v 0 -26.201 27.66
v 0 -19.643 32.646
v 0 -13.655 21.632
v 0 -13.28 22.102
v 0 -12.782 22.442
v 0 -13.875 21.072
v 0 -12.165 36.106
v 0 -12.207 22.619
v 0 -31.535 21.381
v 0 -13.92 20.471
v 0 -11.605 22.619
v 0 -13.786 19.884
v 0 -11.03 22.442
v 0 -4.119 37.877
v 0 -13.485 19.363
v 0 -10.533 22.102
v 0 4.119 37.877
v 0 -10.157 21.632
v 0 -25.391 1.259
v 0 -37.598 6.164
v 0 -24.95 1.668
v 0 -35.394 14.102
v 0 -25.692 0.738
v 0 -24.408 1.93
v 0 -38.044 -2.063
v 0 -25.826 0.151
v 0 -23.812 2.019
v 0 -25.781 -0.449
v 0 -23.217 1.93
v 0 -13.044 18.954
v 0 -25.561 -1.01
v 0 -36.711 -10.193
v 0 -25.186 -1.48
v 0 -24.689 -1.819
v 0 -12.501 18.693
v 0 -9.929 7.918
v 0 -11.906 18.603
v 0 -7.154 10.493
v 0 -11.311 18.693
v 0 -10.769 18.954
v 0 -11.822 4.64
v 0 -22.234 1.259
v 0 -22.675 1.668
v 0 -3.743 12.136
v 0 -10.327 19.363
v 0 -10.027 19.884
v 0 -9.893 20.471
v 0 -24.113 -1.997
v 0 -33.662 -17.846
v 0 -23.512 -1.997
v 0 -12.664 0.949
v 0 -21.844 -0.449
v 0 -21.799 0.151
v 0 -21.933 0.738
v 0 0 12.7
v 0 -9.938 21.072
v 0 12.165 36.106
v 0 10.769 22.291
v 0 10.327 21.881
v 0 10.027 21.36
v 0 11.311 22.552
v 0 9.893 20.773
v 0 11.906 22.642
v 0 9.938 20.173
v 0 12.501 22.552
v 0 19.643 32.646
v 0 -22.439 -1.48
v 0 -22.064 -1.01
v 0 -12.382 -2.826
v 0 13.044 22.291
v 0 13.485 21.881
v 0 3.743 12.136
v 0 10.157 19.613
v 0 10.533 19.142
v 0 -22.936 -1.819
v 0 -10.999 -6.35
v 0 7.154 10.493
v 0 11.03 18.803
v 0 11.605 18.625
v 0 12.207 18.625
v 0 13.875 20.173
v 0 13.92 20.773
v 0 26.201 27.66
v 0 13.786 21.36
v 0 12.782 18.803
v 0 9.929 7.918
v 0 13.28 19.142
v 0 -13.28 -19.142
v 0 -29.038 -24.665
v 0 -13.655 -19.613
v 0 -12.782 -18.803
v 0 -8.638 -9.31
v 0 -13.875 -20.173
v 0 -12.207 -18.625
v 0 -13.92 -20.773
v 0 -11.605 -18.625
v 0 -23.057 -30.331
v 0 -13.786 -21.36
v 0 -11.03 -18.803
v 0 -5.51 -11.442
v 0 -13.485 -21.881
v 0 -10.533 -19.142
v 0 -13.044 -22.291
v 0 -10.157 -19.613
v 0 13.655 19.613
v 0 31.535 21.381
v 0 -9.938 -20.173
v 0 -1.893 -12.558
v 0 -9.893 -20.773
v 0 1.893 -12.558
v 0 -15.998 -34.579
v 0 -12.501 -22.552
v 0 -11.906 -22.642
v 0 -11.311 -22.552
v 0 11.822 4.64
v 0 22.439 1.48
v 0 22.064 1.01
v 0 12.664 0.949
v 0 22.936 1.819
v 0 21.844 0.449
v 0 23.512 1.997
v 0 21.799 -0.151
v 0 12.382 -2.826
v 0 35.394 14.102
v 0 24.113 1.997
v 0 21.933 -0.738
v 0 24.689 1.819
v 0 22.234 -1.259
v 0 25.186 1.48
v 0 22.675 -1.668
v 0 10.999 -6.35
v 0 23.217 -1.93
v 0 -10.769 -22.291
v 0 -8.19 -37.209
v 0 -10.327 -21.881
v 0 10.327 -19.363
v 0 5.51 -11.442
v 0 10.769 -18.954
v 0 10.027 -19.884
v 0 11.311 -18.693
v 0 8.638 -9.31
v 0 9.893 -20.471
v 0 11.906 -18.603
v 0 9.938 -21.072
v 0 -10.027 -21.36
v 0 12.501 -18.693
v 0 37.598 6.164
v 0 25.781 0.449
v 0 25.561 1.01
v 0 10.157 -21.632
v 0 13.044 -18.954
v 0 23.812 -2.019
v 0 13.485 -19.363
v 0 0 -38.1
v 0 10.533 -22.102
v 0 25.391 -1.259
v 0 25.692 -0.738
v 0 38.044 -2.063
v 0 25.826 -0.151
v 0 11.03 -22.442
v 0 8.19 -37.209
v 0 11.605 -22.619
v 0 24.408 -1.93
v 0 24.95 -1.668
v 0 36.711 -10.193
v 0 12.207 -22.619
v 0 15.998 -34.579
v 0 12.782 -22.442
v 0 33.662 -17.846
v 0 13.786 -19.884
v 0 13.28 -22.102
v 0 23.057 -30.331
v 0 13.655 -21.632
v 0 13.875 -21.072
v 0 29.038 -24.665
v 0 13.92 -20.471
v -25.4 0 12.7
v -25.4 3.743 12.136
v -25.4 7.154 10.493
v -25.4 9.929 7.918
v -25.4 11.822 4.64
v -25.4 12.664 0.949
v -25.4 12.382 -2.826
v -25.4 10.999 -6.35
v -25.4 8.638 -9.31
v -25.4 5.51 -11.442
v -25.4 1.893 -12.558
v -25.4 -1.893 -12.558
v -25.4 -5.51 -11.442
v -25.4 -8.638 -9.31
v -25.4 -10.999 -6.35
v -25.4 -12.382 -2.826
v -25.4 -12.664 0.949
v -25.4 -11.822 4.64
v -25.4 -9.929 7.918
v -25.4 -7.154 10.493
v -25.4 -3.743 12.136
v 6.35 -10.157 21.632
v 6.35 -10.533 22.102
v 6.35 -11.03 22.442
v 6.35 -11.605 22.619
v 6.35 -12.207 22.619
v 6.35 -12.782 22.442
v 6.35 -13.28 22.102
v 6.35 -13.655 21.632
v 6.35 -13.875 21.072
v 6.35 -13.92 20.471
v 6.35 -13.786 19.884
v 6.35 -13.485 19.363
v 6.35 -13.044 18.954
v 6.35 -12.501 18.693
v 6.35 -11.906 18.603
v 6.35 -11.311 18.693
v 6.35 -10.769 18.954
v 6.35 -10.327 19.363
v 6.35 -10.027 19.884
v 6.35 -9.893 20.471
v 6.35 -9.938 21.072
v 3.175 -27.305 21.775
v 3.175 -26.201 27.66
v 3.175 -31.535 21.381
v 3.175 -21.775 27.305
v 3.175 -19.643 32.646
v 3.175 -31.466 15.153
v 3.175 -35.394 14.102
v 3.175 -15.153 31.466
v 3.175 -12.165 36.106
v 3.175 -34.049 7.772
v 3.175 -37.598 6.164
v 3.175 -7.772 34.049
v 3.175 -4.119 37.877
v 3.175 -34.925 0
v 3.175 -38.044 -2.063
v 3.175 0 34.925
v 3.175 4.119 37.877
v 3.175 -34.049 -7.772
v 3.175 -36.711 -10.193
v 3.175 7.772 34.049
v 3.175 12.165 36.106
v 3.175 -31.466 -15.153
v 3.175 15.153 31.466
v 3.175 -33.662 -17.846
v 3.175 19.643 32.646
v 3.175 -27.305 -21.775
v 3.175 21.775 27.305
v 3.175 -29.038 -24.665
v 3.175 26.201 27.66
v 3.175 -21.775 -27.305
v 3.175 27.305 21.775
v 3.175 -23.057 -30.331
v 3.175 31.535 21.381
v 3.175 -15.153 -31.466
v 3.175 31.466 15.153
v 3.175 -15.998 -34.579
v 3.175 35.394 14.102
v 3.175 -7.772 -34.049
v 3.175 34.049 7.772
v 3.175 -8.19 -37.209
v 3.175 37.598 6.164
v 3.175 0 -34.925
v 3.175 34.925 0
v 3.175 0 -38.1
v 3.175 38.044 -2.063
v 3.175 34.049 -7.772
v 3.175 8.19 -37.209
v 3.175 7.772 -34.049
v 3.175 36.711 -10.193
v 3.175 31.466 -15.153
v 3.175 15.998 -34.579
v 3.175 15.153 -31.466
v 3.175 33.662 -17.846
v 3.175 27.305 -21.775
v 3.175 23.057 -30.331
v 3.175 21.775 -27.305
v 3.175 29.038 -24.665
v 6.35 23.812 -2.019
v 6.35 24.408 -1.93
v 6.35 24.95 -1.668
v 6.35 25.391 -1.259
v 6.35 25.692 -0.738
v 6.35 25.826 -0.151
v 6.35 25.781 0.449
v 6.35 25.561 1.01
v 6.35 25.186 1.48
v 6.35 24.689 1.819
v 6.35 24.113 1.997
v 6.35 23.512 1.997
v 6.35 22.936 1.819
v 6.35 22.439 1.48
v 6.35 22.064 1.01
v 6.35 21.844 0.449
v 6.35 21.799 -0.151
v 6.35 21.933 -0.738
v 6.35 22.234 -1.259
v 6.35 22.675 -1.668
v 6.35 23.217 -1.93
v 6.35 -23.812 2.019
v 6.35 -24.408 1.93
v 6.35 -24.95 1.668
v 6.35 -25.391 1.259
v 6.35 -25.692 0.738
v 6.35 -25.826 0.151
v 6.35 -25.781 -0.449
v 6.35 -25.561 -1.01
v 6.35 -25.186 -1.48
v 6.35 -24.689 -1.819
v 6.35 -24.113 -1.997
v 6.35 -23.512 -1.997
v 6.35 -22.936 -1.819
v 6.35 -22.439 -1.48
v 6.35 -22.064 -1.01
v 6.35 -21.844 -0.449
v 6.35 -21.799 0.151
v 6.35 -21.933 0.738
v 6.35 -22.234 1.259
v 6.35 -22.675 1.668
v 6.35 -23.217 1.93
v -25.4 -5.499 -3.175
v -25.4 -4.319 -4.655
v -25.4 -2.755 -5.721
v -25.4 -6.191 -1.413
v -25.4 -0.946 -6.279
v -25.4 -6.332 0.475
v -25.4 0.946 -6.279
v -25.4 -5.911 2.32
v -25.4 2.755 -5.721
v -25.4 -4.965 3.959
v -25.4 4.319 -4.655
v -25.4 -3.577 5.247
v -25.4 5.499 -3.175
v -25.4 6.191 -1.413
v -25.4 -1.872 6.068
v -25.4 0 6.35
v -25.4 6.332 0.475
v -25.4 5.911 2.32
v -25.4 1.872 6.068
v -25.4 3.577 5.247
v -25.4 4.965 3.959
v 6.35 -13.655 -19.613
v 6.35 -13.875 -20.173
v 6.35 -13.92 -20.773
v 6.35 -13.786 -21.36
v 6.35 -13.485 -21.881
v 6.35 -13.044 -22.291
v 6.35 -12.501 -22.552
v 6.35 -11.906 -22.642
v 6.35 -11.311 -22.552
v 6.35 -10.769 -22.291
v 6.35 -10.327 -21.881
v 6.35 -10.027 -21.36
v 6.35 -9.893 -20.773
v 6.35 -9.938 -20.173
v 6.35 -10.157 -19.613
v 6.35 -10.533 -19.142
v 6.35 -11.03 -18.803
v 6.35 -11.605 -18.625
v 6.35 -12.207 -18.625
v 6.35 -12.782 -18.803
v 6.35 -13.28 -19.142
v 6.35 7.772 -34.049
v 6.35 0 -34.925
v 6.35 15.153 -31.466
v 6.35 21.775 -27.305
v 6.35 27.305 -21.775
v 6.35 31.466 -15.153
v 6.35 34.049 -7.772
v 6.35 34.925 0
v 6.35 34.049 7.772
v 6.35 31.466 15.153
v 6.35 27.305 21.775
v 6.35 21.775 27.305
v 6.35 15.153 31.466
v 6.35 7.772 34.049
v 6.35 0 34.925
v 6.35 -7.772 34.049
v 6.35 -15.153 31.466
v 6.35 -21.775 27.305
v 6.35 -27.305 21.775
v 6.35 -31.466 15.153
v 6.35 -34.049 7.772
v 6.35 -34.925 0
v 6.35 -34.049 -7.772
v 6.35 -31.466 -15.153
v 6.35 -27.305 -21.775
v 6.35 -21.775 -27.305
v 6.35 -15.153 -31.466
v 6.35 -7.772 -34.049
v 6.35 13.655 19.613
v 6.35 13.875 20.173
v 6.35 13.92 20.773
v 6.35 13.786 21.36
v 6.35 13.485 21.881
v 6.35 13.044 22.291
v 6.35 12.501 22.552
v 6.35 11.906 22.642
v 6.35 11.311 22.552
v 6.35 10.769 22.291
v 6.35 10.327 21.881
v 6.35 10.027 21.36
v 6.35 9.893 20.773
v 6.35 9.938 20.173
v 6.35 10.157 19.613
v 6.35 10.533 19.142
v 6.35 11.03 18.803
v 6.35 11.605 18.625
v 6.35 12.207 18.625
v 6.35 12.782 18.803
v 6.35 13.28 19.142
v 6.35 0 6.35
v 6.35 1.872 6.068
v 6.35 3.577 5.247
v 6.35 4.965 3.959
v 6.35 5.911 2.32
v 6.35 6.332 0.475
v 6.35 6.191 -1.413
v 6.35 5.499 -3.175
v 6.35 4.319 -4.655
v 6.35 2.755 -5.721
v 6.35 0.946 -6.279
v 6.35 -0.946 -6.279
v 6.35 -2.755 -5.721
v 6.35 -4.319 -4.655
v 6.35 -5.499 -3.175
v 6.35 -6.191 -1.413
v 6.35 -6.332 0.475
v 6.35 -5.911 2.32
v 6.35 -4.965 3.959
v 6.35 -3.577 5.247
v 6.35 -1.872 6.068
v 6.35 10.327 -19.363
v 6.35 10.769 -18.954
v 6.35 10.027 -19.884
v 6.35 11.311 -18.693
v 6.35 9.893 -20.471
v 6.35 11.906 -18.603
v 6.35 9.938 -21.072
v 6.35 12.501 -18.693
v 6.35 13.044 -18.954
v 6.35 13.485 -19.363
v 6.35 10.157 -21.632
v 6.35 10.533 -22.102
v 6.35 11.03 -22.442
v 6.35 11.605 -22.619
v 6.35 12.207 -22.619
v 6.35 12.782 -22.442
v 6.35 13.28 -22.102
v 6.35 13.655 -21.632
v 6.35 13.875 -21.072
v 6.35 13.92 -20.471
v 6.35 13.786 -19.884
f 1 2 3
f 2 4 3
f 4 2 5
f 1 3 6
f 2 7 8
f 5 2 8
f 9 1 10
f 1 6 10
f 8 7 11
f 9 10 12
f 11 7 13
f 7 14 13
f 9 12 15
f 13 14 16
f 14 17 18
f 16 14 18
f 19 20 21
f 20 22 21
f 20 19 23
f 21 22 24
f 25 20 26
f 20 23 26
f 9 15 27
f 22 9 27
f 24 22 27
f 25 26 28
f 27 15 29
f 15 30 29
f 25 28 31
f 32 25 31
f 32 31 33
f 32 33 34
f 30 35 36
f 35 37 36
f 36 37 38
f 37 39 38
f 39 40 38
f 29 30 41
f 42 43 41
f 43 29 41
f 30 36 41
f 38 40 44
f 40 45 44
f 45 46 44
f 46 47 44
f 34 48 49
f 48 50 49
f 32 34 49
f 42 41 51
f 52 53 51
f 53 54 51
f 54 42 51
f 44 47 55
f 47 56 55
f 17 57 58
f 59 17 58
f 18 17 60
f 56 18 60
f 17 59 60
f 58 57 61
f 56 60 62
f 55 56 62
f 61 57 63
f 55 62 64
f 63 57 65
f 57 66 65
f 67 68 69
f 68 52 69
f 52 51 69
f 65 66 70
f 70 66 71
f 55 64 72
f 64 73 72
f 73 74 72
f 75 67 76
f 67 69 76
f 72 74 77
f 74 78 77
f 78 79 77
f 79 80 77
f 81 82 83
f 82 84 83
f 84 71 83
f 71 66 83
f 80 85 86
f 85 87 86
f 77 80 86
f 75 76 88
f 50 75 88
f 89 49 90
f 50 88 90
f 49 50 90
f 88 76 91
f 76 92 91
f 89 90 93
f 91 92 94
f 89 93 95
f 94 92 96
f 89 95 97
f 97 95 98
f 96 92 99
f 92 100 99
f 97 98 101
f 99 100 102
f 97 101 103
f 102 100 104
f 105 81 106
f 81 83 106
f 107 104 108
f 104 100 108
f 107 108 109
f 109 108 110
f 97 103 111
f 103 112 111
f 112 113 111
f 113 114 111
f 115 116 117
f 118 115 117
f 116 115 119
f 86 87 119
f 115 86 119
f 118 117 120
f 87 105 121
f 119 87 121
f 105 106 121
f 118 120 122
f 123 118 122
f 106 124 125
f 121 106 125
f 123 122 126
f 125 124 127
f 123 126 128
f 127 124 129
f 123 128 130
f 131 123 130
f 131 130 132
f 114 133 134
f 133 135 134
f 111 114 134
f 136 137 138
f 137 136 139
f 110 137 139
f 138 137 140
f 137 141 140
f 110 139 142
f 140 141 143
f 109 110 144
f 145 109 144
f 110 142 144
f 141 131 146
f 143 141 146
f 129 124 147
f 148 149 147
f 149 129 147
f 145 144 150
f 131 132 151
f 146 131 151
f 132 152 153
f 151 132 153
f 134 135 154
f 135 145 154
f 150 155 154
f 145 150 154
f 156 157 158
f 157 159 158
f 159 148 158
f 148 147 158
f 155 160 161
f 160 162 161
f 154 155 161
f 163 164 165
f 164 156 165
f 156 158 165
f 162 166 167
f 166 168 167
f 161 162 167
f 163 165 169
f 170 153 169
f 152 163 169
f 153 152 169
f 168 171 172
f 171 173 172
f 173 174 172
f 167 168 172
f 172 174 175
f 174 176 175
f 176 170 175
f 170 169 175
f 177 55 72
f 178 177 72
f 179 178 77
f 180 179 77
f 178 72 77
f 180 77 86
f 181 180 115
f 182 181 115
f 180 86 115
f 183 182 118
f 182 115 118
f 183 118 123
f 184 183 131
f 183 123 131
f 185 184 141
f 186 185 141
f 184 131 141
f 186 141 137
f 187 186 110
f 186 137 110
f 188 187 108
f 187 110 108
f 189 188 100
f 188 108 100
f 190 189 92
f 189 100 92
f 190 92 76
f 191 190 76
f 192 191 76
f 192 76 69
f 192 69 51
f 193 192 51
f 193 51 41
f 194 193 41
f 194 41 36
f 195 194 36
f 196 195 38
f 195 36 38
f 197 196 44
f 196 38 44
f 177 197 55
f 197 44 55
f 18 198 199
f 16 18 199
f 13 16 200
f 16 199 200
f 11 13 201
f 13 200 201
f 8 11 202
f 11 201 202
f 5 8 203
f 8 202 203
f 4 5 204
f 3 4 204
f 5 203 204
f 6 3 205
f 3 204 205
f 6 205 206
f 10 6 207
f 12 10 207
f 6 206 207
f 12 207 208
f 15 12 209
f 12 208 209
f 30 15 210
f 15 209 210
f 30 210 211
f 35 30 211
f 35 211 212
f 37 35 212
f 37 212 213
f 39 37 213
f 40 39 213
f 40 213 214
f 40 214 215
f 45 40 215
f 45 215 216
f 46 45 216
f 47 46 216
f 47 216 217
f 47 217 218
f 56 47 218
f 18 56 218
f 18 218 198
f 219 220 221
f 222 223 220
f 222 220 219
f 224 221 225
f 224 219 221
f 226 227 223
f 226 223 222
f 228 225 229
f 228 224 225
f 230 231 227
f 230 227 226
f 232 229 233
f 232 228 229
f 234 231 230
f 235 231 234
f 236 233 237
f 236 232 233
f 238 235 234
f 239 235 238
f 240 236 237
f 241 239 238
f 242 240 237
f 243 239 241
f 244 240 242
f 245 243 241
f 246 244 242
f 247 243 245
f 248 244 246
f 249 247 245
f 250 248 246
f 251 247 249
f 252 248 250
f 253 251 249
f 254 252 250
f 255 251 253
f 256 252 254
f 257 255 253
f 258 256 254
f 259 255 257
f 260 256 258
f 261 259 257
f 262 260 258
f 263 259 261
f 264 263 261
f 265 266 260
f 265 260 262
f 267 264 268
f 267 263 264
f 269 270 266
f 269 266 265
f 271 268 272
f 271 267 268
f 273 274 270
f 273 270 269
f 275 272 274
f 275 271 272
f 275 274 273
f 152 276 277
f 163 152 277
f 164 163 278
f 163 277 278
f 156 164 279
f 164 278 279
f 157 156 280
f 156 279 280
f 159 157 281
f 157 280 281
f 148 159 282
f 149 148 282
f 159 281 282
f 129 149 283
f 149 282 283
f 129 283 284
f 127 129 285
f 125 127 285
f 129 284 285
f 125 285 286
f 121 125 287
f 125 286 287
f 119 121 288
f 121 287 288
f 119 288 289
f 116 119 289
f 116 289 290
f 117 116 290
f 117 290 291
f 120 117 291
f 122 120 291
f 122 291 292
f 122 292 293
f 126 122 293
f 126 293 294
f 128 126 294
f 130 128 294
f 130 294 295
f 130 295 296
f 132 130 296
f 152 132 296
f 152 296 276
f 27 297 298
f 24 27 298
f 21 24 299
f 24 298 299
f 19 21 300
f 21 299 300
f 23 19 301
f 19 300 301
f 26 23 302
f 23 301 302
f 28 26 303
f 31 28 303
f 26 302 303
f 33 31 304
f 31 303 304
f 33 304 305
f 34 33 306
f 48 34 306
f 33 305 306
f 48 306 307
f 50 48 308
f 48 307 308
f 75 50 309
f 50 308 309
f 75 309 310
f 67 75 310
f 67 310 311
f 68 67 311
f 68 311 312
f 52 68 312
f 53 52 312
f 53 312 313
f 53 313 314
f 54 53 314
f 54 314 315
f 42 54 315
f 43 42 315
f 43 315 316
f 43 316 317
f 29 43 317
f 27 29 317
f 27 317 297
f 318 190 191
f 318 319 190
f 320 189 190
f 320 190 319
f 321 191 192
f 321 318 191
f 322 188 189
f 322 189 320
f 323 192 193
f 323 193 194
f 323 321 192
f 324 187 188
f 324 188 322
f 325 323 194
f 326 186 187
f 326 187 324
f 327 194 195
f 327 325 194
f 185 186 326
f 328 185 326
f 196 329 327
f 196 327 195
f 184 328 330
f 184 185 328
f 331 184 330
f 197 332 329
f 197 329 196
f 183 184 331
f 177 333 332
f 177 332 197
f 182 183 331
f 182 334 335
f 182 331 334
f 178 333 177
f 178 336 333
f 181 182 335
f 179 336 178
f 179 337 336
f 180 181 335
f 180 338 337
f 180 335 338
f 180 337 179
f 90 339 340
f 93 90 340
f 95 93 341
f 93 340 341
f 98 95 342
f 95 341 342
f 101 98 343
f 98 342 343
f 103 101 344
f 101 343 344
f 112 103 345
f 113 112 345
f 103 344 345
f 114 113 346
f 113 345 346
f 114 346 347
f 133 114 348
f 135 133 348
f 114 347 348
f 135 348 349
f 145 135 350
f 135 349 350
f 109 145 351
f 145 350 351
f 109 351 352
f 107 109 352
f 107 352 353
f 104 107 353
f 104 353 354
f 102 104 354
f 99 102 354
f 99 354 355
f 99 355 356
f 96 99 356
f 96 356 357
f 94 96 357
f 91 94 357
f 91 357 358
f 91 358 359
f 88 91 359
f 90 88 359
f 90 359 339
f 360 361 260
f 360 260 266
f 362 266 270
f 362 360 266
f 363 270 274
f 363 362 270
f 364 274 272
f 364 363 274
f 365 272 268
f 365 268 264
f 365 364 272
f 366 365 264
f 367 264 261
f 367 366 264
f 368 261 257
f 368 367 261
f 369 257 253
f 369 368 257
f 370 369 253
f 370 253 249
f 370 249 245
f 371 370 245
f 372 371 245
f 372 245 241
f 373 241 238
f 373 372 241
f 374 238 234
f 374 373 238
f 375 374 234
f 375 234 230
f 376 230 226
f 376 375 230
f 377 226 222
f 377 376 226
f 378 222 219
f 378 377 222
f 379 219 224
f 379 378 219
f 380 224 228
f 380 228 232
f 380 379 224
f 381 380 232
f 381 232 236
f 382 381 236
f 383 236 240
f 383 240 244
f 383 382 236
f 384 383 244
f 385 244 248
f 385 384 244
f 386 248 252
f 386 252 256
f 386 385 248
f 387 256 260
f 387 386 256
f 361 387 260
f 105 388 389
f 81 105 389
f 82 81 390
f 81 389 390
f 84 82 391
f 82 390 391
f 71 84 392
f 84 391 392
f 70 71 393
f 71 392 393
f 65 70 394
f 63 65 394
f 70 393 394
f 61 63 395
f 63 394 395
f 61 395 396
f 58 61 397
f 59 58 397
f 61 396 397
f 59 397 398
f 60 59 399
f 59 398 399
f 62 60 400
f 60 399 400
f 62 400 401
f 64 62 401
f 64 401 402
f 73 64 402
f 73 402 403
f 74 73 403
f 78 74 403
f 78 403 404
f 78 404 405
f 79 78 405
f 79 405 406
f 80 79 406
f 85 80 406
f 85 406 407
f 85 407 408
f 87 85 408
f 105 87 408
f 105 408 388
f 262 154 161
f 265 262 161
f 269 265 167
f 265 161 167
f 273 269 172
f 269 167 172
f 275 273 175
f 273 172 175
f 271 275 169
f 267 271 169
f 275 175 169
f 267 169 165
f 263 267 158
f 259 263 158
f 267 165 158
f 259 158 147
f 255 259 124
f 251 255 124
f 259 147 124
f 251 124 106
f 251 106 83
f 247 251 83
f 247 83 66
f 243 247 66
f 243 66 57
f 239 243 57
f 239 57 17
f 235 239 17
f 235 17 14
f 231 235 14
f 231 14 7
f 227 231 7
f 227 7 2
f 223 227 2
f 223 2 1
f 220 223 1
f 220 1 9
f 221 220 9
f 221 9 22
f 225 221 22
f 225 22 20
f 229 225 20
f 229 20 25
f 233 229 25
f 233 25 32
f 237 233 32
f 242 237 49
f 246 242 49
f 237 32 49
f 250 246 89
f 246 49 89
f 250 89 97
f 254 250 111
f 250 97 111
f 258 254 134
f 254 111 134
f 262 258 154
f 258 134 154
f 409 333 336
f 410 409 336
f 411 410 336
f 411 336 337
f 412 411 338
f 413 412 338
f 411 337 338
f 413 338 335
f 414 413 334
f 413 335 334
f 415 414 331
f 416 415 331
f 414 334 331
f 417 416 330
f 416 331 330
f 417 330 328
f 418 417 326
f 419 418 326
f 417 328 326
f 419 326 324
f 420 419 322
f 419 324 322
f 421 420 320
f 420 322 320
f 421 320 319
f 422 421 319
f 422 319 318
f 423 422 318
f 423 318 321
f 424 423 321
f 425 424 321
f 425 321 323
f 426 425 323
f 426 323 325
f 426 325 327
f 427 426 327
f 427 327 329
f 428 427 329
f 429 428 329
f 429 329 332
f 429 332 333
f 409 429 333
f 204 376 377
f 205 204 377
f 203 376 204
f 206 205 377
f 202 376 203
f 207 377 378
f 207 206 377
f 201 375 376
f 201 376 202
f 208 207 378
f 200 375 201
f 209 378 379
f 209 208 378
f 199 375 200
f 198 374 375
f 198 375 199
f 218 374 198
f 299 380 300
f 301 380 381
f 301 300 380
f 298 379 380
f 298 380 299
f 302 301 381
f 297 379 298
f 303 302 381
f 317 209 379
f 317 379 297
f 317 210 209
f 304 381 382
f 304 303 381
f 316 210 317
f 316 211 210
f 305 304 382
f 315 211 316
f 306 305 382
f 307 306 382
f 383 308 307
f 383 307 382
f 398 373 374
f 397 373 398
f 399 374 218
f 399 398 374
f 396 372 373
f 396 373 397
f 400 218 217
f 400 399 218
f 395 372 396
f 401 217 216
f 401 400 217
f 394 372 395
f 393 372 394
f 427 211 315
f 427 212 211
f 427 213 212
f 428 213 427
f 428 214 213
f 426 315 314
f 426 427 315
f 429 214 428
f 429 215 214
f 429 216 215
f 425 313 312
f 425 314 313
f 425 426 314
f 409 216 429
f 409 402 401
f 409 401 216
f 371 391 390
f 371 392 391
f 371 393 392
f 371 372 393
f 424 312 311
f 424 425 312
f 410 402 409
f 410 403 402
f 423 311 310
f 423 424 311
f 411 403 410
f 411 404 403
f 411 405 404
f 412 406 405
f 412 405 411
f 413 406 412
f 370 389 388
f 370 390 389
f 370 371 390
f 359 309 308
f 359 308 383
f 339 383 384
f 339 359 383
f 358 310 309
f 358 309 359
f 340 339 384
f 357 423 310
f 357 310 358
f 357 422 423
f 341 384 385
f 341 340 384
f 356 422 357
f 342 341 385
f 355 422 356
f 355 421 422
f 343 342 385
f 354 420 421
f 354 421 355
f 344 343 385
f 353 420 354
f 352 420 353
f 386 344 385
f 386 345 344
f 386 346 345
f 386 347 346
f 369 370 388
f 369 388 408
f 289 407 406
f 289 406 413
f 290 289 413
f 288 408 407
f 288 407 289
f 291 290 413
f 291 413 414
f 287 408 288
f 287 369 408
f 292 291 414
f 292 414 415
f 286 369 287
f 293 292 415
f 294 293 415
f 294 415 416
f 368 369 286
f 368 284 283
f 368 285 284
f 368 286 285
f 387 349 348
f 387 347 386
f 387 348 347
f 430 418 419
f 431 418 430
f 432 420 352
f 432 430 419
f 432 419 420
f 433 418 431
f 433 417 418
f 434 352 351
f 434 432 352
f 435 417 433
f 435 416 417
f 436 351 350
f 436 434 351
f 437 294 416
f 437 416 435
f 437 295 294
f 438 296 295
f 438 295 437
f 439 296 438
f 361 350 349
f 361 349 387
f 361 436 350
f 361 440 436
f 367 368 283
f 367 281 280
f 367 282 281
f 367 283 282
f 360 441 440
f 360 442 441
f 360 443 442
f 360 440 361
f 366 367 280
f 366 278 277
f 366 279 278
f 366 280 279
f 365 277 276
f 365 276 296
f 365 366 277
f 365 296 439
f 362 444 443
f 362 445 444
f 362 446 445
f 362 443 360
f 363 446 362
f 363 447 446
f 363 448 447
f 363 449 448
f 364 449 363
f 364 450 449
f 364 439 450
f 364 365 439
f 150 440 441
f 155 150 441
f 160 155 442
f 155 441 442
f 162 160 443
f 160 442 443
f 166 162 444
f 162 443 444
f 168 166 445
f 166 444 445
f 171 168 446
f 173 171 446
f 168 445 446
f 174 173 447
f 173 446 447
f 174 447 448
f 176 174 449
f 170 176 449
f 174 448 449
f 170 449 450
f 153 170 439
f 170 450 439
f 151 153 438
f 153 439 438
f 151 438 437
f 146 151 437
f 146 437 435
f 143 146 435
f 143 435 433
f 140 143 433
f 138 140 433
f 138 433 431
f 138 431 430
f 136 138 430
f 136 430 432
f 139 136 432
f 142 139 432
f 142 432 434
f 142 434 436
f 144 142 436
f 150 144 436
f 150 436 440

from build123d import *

# Parameters (mm, degrees)
SKETCH1_R                  = 38.1
BOSS_EXTRUDE1_DEPTH        = 6.35
SKETCH3_R                  = 38.1
SKETCH3_R_2                = 34.925
CUT_EXTRUDE_THIN1_DEPTH    = 3.175
SKETCH8_R                  = 12.7
BOSS_EXTRUDE2_DEPTH        = 25.4
F_1_2_0_5_DIAMETER_HOLE1_D = 12.7
F_10_32_TAPPED_HOLE1_D     = 4.0386
CIRPATTERN1_COUNT          = 6


with BuildPart() as part:
    # Sketch1 → Boss-Extrude1 (new body)
    with BuildSketch(Plane(origin=(0, 0, 0), x_dir=(0, 0, -1), z_dir=(1, 0, 0))):
        Circle(SKETCH1_R)
    extrude(amount=BOSS_EXTRUDE1_DEPTH)

    # Sketch3 → Cut-Extrude-Thin1 (cut)
    with BuildSketch(Plane(origin=(6.35, 0, 0), x_dir=(0, 0, -1), z_dir=(1, 0, 0))):
        Circle(SKETCH3_R)
        Circle(SKETCH3_R_2, mode=Mode.SUBTRACT)
    extrude(amount=-CUT_EXTRUDE_THIN1_DEPTH, mode=Mode.SUBTRACT)

    # Sketch8 → Boss-Extrude2 (add)
    with BuildSketch(Plane.ZY):
        Circle(SKETCH8_R)
    extrude(amount=BOSS_EXTRUDE2_DEPTH)

    # 1/2 (0.5) Diameter Hole1 (through all)
    with Locations(Plane(origin=(6.35, 0, 0), x_dir=(0, 0, -1), z_dir=(1, 0, 0))):
        with Locations((0, 0)):
            Hole(F_1_2_0_5_DIAMETER_HOLE1_D / 2)

    # #10-32 Tapped Hole1 (through all)
    with Locations(Plane.ZY):
        with Locations((0, 23.8125)):
            f_10_32_tapped_hole1 = Hole(F_10_32_TAPPED_HOLE1_D / 2)

    # CirPattern1: #10-32 Tapped Hole1 ×6 about axis
    cirpattern1_axis = Axis((0, 0, 0), (1, 0, 0))
    for i in range(1, CIRPATTERN1_COUNT):
        add(f_10_32_tapped_hole1.rotate(cirpattern1_axis, i * 360 / CIRPATTERN1_COUNT), mode=Mode.SUBTRACT)


solid = part.part
